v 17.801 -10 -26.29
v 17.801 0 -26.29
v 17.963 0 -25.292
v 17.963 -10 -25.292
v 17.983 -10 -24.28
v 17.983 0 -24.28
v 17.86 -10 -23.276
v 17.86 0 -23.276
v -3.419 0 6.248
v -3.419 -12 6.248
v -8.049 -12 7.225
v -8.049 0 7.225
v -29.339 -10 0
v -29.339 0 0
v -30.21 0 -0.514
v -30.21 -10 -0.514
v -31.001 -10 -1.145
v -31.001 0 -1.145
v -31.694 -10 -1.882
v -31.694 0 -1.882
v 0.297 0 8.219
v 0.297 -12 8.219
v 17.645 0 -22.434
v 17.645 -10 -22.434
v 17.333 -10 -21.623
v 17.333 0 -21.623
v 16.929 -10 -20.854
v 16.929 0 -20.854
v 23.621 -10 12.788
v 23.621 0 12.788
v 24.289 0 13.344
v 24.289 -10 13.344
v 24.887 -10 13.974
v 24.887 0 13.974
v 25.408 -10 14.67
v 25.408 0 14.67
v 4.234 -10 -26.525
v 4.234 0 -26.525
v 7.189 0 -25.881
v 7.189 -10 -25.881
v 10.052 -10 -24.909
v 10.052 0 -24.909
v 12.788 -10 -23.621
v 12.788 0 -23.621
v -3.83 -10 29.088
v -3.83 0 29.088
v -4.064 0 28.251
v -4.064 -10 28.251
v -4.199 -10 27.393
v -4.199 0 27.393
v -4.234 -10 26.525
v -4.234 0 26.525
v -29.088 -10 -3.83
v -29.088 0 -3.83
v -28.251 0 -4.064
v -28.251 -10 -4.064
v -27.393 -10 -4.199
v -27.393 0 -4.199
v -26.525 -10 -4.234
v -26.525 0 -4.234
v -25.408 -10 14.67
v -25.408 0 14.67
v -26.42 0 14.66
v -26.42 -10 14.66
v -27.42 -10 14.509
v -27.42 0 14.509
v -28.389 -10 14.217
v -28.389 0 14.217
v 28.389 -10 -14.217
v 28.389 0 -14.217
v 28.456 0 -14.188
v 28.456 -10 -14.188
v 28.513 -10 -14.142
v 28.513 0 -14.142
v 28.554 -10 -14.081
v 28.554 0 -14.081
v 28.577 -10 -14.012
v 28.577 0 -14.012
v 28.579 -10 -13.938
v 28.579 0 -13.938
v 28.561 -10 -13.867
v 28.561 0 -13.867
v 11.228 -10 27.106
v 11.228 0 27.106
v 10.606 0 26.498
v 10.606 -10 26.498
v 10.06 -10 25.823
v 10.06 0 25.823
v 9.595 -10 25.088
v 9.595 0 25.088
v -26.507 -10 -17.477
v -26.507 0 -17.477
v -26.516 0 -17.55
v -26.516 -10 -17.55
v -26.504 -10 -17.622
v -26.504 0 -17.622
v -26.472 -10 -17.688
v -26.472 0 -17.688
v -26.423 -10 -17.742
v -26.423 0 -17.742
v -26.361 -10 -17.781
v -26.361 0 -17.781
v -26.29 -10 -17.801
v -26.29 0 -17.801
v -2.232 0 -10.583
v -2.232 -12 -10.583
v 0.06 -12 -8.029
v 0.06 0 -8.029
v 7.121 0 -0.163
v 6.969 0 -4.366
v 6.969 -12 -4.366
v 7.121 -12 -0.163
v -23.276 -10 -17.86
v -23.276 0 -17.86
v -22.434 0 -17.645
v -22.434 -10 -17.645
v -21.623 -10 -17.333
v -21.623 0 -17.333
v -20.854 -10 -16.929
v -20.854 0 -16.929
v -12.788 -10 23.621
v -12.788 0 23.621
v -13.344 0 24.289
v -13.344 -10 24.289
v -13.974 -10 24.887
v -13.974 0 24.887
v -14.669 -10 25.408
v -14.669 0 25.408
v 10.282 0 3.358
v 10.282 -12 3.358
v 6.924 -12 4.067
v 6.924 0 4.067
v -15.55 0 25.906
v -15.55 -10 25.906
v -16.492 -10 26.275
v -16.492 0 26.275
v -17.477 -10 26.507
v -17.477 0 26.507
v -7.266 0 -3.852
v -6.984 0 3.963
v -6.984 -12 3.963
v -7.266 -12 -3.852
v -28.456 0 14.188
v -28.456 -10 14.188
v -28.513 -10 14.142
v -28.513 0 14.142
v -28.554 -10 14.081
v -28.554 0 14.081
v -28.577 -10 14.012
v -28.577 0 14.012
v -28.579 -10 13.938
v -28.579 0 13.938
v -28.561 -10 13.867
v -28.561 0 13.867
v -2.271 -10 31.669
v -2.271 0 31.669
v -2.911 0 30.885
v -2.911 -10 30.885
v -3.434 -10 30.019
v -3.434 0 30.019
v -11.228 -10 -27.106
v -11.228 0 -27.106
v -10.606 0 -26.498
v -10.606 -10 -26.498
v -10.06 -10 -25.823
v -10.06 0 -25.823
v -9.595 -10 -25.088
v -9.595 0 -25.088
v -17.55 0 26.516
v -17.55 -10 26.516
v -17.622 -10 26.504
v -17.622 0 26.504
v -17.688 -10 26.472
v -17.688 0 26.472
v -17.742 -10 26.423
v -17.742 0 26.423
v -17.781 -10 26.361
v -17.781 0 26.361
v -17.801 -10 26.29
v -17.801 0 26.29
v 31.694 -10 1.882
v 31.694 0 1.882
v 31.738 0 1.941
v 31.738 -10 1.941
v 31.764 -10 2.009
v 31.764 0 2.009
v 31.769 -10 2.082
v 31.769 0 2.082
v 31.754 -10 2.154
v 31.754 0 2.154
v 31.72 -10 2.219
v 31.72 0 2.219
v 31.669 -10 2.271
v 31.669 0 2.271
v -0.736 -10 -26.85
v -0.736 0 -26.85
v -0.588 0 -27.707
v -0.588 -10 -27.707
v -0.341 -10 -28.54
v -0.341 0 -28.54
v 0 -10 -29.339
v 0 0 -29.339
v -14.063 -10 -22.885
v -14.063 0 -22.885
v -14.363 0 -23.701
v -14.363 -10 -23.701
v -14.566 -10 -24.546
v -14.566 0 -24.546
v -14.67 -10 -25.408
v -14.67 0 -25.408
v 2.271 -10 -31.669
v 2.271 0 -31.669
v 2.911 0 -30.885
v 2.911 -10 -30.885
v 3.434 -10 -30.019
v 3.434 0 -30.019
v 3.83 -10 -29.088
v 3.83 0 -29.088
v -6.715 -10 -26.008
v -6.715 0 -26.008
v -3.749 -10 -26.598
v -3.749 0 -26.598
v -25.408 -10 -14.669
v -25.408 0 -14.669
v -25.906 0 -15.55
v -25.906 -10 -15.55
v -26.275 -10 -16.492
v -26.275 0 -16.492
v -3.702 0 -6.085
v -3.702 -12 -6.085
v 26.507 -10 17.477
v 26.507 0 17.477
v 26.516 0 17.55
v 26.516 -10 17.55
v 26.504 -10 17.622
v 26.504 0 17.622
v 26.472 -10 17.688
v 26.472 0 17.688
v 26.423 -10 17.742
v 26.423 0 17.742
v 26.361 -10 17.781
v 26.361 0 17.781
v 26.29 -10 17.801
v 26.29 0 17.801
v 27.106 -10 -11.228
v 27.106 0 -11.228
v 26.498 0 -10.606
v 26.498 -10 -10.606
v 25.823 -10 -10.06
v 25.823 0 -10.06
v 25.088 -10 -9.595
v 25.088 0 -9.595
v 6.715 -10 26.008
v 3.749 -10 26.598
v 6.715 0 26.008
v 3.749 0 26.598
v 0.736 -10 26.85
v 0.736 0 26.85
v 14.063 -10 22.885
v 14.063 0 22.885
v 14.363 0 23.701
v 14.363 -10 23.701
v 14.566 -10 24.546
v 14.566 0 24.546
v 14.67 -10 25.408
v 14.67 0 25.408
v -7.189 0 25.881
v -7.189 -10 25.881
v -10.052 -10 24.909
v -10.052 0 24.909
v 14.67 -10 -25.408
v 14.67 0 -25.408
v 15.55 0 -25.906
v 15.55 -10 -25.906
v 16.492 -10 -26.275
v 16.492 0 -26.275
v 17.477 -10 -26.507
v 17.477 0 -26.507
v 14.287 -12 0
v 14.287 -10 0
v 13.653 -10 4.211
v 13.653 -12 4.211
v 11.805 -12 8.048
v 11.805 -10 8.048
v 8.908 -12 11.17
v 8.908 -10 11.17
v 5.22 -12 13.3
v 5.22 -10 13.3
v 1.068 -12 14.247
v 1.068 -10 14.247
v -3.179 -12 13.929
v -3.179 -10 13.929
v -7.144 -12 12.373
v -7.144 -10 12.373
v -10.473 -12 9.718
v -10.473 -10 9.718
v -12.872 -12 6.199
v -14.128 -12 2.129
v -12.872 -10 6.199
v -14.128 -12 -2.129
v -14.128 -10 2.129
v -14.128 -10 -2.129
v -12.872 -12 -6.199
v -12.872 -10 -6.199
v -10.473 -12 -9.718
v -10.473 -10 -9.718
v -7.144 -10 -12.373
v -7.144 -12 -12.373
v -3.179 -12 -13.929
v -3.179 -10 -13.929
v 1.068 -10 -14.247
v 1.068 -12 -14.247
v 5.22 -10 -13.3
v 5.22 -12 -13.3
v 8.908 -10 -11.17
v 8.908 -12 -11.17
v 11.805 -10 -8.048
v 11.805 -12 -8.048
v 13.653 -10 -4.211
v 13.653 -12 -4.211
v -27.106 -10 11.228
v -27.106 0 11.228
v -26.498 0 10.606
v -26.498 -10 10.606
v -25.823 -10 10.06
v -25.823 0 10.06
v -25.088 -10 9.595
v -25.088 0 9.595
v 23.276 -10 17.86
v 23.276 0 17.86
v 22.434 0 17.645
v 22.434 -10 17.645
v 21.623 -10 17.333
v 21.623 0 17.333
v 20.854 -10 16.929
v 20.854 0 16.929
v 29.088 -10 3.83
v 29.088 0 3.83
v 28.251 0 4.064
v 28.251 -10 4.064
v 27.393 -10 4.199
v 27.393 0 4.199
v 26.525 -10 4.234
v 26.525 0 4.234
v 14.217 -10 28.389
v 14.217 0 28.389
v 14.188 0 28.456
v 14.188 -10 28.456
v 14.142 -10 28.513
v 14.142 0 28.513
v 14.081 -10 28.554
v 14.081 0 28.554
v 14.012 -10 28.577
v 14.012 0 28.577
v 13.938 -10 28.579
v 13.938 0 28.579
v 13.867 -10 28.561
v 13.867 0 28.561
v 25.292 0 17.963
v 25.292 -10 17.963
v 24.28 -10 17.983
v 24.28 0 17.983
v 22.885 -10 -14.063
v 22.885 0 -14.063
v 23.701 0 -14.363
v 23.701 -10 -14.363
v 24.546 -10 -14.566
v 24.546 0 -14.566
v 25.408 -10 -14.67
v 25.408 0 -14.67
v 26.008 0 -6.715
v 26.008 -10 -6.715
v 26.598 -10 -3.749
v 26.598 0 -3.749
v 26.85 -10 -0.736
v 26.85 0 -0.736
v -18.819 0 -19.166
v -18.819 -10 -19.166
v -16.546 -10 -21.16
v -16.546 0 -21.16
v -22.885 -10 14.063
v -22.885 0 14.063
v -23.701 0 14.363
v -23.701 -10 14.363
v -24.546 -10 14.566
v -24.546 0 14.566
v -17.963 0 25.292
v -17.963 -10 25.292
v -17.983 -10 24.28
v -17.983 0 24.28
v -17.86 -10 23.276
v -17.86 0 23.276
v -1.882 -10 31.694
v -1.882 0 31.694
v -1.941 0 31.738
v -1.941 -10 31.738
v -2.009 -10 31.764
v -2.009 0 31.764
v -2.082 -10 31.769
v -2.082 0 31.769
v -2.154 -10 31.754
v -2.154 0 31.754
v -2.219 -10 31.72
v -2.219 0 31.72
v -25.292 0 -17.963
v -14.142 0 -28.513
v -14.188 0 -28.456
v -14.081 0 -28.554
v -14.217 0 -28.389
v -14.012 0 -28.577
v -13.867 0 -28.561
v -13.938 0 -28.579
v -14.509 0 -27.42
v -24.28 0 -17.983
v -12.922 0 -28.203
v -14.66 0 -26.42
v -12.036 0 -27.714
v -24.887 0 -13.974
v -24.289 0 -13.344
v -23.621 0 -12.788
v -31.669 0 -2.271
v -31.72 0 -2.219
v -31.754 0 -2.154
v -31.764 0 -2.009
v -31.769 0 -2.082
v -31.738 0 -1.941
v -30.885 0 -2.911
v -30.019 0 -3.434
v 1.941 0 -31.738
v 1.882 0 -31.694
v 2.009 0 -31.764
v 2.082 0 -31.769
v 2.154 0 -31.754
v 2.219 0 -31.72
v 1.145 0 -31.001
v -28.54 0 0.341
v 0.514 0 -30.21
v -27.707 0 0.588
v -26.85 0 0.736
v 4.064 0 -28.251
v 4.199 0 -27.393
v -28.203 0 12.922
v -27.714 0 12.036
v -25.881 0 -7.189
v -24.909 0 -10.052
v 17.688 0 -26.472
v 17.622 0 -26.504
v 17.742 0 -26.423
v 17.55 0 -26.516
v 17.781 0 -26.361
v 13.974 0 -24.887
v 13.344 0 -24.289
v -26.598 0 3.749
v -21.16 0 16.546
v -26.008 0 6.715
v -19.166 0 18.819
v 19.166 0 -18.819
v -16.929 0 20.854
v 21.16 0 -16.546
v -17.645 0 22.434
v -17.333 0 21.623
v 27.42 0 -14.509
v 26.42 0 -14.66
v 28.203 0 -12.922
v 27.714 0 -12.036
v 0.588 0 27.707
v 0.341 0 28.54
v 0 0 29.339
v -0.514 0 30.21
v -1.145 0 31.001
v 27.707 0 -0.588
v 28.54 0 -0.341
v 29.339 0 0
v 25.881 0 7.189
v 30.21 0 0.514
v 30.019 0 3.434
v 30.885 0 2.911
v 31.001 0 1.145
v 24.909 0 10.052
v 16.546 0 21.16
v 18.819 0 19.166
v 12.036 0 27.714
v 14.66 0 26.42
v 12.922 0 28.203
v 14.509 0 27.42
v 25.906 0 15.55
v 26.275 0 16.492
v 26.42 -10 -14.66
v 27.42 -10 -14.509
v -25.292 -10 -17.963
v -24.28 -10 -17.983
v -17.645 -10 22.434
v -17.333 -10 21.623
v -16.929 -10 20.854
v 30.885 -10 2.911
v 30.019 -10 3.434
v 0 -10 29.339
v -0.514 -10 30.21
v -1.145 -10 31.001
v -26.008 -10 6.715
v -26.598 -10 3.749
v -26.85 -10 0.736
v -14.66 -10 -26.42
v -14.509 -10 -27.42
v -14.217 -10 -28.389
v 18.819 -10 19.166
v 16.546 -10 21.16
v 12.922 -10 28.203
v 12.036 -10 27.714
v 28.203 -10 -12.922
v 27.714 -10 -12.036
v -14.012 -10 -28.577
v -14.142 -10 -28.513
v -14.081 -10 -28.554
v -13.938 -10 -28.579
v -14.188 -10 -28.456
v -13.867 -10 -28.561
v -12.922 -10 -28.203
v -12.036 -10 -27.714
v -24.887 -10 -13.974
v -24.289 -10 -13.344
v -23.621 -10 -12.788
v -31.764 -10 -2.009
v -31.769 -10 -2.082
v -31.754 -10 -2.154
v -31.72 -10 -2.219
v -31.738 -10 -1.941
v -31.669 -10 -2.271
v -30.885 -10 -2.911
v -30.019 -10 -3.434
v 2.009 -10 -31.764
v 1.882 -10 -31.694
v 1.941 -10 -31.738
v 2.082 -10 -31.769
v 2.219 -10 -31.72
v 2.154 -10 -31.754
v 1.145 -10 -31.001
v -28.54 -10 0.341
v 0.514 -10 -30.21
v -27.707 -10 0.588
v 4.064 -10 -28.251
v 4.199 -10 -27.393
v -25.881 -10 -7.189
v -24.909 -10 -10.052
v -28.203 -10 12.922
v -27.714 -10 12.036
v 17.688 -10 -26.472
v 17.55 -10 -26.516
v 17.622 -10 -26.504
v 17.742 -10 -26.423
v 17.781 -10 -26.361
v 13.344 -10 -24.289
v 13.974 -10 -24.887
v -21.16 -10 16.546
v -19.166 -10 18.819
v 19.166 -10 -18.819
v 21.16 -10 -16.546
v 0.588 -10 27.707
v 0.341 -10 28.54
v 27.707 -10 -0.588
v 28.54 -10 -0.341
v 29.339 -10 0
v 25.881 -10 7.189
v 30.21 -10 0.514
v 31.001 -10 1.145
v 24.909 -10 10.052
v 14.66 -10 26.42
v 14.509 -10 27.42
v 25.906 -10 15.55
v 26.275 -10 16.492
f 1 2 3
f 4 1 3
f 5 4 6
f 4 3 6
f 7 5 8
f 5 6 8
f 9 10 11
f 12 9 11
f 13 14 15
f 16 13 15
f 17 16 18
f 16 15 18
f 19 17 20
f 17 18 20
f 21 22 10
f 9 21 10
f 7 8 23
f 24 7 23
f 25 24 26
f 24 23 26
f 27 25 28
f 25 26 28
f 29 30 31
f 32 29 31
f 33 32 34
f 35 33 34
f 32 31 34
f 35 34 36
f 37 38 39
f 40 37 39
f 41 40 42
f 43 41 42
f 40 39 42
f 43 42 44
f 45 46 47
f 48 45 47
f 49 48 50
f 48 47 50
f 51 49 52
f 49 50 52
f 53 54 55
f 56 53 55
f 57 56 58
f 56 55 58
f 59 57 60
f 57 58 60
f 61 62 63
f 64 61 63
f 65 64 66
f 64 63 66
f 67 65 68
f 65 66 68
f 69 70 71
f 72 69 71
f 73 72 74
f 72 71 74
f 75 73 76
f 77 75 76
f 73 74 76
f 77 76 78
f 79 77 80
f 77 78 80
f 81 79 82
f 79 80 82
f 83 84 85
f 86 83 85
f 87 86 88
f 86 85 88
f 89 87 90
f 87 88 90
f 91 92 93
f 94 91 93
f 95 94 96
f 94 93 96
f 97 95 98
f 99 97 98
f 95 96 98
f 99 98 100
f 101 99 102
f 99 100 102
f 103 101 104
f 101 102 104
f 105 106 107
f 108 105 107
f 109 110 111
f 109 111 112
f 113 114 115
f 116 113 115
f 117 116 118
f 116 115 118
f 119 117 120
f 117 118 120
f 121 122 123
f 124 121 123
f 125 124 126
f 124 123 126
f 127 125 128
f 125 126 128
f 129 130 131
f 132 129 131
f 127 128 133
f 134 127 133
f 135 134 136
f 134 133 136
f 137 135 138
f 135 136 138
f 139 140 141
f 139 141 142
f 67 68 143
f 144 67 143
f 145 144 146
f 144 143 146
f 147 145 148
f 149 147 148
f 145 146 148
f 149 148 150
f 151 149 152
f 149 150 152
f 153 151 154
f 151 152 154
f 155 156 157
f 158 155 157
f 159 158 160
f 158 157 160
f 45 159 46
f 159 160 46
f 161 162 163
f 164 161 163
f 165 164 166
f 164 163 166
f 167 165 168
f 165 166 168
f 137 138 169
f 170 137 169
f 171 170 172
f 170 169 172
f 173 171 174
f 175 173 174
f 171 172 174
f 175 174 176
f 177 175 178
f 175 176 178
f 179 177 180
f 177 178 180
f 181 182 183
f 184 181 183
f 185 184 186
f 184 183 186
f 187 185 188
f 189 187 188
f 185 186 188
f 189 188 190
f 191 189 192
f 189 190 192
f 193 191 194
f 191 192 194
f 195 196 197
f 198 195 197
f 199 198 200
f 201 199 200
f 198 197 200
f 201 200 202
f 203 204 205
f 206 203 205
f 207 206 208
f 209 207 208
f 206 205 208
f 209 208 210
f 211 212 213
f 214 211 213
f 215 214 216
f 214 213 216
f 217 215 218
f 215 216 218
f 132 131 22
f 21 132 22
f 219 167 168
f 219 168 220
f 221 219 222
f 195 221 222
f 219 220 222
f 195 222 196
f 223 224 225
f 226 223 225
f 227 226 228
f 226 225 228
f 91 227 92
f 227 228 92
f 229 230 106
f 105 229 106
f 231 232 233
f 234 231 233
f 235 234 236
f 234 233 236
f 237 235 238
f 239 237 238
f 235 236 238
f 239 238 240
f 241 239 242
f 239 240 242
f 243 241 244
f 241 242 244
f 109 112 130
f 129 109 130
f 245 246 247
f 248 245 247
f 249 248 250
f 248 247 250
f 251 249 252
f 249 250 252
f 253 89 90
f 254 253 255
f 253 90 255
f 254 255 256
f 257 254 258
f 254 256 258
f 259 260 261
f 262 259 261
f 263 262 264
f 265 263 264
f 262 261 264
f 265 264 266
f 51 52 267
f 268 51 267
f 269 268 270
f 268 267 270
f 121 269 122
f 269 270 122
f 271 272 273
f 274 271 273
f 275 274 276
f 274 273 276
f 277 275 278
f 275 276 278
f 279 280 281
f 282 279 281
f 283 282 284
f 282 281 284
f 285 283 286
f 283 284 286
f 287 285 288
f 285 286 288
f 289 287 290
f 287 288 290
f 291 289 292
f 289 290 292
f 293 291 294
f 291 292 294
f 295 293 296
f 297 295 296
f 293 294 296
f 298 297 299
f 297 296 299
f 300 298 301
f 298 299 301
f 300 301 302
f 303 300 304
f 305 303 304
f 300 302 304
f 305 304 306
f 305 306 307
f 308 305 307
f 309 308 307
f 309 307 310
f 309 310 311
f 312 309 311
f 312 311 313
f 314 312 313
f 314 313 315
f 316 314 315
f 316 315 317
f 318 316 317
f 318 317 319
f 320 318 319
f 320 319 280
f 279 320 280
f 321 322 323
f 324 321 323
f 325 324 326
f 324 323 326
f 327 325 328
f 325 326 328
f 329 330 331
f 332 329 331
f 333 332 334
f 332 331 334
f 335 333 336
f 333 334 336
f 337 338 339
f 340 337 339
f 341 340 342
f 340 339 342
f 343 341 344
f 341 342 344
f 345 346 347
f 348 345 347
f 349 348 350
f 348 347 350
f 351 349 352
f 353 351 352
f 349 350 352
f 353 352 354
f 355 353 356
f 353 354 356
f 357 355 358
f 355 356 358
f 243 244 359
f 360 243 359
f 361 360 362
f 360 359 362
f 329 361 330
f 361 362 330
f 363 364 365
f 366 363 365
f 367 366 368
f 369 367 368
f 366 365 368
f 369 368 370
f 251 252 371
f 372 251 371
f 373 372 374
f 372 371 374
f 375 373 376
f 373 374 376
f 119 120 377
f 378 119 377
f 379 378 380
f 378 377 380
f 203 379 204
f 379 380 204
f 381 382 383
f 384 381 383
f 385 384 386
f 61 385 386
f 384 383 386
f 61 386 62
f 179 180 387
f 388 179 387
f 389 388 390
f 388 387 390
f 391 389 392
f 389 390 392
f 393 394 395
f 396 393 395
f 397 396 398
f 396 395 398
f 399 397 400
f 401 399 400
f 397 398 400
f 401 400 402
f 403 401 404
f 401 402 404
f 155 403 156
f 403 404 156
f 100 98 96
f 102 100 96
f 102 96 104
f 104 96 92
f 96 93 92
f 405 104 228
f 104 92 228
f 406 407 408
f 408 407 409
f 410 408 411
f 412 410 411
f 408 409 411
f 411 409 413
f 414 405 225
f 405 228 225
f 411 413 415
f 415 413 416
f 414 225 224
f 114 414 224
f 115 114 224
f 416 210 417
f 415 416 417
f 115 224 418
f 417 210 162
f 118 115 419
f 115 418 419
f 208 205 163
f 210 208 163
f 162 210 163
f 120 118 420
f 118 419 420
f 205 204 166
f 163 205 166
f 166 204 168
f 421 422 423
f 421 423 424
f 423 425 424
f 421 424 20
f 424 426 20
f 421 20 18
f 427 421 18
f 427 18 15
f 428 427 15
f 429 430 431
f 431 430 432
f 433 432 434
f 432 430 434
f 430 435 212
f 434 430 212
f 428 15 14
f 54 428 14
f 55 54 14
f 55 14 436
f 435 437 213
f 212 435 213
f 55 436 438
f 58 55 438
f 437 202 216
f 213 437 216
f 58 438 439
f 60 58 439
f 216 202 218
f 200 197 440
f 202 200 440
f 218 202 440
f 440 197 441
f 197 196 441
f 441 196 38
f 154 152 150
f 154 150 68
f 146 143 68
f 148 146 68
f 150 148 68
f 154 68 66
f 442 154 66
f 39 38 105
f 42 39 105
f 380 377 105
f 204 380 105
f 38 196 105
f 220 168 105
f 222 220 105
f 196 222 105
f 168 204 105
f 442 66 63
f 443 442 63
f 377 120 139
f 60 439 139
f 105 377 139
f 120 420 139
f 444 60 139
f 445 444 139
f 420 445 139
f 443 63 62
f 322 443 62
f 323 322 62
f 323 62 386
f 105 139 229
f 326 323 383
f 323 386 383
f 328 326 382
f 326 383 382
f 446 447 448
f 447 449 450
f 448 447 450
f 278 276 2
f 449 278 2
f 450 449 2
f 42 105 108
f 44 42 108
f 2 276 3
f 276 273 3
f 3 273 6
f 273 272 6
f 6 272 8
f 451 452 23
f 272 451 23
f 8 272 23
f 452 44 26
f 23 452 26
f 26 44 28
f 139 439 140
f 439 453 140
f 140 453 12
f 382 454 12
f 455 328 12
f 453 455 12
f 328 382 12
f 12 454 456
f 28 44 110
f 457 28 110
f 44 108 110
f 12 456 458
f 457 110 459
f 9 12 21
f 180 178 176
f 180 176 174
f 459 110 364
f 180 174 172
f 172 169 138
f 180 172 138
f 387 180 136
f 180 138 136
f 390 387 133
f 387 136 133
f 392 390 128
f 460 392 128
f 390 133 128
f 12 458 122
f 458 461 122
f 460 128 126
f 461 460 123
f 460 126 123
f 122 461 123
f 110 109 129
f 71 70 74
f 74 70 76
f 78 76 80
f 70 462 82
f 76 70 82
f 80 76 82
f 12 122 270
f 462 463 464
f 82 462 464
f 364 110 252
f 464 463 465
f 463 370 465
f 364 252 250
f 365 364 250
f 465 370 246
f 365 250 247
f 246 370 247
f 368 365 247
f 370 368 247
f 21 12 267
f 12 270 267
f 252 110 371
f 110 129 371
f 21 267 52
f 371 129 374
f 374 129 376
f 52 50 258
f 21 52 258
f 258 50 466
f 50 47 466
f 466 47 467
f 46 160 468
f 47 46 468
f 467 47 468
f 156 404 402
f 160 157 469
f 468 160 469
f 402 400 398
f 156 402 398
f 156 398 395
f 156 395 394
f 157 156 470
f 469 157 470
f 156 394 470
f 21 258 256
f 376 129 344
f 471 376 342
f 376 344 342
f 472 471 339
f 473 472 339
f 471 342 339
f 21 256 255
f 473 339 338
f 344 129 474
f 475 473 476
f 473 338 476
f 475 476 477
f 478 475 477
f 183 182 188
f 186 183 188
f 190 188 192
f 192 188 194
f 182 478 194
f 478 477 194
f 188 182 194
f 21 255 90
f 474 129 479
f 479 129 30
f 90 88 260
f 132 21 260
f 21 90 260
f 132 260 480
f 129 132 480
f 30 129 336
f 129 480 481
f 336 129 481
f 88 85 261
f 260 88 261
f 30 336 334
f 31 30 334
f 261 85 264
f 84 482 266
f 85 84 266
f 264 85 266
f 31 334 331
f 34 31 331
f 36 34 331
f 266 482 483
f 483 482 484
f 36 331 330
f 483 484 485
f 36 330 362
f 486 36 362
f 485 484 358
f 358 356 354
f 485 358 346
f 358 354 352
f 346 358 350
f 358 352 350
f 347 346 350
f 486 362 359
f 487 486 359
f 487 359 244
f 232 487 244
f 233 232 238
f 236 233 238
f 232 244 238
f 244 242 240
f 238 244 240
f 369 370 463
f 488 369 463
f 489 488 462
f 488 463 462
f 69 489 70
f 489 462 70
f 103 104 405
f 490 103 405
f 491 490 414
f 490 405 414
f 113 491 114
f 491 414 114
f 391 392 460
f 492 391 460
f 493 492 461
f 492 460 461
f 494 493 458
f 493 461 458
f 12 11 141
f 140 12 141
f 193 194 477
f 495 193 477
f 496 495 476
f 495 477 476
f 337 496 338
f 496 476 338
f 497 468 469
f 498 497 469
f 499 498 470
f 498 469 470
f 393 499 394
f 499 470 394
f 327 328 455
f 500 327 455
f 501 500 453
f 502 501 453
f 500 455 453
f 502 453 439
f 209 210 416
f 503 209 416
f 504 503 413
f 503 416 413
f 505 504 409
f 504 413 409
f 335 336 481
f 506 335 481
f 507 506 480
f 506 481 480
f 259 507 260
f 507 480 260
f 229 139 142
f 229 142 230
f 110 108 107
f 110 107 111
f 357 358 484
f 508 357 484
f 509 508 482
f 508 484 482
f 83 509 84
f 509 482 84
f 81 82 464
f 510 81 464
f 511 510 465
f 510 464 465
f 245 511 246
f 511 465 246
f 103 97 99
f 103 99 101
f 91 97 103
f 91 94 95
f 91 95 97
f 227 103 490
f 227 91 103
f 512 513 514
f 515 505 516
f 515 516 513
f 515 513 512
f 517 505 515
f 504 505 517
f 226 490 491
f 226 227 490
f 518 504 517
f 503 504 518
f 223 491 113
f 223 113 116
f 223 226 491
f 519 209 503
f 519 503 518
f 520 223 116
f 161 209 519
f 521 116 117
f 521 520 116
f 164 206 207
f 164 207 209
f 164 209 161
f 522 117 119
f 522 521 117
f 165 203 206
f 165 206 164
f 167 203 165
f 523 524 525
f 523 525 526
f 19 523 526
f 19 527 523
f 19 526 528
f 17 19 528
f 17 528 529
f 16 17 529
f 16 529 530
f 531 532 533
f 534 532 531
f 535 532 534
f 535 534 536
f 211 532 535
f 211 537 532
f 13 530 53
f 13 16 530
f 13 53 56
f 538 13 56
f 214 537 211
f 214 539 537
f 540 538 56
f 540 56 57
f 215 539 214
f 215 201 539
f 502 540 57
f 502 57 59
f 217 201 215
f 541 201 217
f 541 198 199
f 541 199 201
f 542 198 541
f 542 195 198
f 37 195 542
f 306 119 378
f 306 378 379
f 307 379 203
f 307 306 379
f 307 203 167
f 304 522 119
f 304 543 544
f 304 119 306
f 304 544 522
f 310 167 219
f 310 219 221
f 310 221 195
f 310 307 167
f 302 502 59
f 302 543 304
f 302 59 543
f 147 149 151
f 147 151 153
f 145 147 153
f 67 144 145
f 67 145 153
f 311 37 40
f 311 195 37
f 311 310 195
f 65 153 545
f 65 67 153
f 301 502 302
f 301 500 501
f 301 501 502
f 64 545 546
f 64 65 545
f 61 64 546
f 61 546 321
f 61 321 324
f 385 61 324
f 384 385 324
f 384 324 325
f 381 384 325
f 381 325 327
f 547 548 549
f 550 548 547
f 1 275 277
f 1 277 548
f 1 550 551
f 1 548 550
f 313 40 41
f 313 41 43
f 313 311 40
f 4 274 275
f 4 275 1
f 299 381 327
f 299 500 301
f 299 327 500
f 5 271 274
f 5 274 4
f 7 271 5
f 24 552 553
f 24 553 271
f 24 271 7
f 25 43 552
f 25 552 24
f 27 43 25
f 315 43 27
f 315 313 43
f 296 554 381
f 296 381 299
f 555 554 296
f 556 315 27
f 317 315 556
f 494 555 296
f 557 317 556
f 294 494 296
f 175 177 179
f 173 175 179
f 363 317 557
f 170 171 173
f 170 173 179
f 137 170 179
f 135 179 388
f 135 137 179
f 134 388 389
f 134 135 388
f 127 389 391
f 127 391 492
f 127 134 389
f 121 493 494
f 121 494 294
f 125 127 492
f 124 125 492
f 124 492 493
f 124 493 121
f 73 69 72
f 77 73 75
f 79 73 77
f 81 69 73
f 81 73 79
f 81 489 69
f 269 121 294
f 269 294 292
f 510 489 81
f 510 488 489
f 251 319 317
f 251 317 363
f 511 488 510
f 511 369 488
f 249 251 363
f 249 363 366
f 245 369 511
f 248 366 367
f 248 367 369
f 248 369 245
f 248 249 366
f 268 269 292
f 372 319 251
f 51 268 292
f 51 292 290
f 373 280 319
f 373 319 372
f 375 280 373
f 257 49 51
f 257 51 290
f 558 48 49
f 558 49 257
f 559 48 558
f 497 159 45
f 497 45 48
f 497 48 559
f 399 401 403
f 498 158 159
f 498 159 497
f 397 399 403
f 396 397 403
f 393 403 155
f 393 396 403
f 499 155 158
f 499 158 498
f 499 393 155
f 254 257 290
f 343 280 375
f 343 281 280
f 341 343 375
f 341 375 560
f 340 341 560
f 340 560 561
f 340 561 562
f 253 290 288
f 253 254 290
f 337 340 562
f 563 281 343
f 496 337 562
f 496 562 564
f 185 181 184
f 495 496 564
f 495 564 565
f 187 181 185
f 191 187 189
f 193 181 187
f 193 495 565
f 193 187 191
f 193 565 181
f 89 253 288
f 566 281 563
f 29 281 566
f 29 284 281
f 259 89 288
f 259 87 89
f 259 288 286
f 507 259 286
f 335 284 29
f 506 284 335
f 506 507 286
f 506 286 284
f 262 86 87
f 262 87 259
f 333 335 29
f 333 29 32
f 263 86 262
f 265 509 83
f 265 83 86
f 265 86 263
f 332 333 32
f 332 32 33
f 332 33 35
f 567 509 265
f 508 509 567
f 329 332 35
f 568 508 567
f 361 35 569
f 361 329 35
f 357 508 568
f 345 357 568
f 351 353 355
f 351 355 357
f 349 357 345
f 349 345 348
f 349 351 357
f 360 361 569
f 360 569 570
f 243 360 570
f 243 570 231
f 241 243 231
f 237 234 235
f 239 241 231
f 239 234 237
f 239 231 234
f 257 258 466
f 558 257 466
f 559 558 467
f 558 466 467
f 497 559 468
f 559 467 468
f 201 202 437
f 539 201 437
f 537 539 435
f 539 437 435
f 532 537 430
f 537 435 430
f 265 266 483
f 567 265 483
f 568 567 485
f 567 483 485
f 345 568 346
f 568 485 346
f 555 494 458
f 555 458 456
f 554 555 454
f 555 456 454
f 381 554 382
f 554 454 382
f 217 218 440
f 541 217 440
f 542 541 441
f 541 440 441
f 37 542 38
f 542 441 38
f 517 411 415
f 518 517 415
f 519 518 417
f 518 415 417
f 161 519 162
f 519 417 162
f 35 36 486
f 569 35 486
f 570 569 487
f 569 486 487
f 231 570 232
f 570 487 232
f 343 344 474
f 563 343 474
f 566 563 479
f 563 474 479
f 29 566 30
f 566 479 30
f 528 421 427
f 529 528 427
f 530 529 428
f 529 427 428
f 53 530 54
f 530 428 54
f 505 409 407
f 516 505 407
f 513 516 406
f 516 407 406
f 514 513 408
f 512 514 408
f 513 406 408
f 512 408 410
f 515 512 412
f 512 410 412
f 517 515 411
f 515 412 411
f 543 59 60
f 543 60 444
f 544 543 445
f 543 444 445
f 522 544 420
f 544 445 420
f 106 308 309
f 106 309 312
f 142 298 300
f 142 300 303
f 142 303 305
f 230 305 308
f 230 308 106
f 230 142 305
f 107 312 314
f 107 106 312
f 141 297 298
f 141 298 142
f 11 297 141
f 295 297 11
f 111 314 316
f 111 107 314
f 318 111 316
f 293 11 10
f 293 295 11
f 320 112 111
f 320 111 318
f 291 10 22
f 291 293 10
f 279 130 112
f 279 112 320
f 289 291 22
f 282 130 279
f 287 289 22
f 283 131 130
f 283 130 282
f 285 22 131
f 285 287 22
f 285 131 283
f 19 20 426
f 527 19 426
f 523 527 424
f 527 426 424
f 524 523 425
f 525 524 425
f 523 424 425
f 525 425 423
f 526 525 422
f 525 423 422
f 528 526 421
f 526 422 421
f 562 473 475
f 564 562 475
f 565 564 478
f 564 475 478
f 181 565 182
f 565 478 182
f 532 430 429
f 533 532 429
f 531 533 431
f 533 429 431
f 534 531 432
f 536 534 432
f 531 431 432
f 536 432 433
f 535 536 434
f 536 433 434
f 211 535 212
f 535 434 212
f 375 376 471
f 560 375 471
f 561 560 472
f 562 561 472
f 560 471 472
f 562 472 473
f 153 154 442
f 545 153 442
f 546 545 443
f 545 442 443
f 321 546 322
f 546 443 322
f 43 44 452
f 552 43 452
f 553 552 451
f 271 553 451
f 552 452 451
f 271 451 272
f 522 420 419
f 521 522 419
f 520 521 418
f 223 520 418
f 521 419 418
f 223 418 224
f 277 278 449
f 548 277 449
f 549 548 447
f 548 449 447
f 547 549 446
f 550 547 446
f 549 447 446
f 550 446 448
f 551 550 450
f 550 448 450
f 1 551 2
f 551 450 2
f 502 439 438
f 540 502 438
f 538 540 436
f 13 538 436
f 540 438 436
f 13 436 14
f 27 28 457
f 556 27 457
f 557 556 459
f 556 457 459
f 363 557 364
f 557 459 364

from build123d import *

# Parameters (mm, degrees)
F1_DEPTH = 10
F2_COUNT = 12
F3_R     = 14.287372
F4_DEPTH = 12
F6_DEPTH = 25


with BuildPart() as f1:
    # F0 (on Front) → F1 (new body)
    with BuildSketch(Plane.XZ):
        with BuildLine():
            ThreePointArc((-4.234477, 26.524624), (-17.431958, -20.435589), (26.8605, 0))
            ThreePointArc((26.8605, 0), (19.251731, 18.731186), (0.736092, 26.850412))
            ThreePointArc((0.736092, 26.850412), (-1.756761, 26.80299), (-4.234477, 26.524624))
        make_face()
        with BuildLine():
            ThreePointArc((-4.234477, 26.524624), (-1.756761, 26.80299), (0.736092, 26.850412))
            ThreePointArc((0.736092, 26.850412), (0.47684, 28.126886), (0, 29.339))
            ThreePointArc((0, 29.339), (-0.815533, 30.61676), (-1.881799, 31.694185))
            ThreePointArc((-1.881799, 31.694185), (-2.082262, 31.769175), (-2.271222, 31.66866))
            ThreePointArc((-2.271222, 31.66866), (-3.187733, 30.461278), (-3.829508, 29.088001))
            ThreePointArc((-3.829508, 29.088001), (-4.144055, 27.824016), (-4.234477, 26.524624))
        make_face()
    extrude(amount=F1_DEPTH)

    # F2: F1 ×12 about axis
    f2_axis = Axis((0, 0, 0), (0, -1, 0))


with BuildPart() as f1_1:
    add(f1.part)
    for i in range(1, F2_COUNT):
        add(f1.part.rotate(f2_axis, i * 360 / F2_COUNT))

    # F3 (on Front) → F4 (join)
    with BuildSketch(Plane.XZ):
        Circle(F3_R)
    extrude(amount=F4_DEPTH)

    # F5 (on face) → F6 (cut)
    with BuildSketch(Plane.XZ.offset(12)):
        Polygon((7.265964, 3.852157), (6.923851, 4.066507), (-3.419352, 6.248354), (-6.969048, 4.366431), (-6.983624, 3.962977), (-3.701558, -6.085423), (-0.296916, -8.218588), (0.059773, -8.029484), (7.12091, -0.162932), align=None)
        Polygon((6.923851, 4.066507), (0.296916, 8.218588), (-3.419352, 6.248354), align=None)
        Polygon((6.969048, -4.366431), (7.12091, -0.162932), (0.059773, -8.029484), align=None)
        Polygon((-3.701558, -6.085423), (-6.983624, 3.962977), (-7.265964, -3.852157), align=None)
        Polygon((-6.969048, 4.366431), (-3.419352, 6.248354), (-8.049075, 7.224971), (-6.983624, 3.962977), align=None)
        Polygon((-2.232471, -10.583189), (0.059773, -8.029484), (-0.296916, -8.218588), (-3.701558, -6.085423), align=None)
        Polygon((10.281546, 3.358218), (6.923851, 4.066507), (7.265964, 3.852157), (7.12091, -0.162932), align=None)
    extrude(amount=-F6_DEPTH, mode=Mode.SUBTRACT)


solid = f1_1.part
